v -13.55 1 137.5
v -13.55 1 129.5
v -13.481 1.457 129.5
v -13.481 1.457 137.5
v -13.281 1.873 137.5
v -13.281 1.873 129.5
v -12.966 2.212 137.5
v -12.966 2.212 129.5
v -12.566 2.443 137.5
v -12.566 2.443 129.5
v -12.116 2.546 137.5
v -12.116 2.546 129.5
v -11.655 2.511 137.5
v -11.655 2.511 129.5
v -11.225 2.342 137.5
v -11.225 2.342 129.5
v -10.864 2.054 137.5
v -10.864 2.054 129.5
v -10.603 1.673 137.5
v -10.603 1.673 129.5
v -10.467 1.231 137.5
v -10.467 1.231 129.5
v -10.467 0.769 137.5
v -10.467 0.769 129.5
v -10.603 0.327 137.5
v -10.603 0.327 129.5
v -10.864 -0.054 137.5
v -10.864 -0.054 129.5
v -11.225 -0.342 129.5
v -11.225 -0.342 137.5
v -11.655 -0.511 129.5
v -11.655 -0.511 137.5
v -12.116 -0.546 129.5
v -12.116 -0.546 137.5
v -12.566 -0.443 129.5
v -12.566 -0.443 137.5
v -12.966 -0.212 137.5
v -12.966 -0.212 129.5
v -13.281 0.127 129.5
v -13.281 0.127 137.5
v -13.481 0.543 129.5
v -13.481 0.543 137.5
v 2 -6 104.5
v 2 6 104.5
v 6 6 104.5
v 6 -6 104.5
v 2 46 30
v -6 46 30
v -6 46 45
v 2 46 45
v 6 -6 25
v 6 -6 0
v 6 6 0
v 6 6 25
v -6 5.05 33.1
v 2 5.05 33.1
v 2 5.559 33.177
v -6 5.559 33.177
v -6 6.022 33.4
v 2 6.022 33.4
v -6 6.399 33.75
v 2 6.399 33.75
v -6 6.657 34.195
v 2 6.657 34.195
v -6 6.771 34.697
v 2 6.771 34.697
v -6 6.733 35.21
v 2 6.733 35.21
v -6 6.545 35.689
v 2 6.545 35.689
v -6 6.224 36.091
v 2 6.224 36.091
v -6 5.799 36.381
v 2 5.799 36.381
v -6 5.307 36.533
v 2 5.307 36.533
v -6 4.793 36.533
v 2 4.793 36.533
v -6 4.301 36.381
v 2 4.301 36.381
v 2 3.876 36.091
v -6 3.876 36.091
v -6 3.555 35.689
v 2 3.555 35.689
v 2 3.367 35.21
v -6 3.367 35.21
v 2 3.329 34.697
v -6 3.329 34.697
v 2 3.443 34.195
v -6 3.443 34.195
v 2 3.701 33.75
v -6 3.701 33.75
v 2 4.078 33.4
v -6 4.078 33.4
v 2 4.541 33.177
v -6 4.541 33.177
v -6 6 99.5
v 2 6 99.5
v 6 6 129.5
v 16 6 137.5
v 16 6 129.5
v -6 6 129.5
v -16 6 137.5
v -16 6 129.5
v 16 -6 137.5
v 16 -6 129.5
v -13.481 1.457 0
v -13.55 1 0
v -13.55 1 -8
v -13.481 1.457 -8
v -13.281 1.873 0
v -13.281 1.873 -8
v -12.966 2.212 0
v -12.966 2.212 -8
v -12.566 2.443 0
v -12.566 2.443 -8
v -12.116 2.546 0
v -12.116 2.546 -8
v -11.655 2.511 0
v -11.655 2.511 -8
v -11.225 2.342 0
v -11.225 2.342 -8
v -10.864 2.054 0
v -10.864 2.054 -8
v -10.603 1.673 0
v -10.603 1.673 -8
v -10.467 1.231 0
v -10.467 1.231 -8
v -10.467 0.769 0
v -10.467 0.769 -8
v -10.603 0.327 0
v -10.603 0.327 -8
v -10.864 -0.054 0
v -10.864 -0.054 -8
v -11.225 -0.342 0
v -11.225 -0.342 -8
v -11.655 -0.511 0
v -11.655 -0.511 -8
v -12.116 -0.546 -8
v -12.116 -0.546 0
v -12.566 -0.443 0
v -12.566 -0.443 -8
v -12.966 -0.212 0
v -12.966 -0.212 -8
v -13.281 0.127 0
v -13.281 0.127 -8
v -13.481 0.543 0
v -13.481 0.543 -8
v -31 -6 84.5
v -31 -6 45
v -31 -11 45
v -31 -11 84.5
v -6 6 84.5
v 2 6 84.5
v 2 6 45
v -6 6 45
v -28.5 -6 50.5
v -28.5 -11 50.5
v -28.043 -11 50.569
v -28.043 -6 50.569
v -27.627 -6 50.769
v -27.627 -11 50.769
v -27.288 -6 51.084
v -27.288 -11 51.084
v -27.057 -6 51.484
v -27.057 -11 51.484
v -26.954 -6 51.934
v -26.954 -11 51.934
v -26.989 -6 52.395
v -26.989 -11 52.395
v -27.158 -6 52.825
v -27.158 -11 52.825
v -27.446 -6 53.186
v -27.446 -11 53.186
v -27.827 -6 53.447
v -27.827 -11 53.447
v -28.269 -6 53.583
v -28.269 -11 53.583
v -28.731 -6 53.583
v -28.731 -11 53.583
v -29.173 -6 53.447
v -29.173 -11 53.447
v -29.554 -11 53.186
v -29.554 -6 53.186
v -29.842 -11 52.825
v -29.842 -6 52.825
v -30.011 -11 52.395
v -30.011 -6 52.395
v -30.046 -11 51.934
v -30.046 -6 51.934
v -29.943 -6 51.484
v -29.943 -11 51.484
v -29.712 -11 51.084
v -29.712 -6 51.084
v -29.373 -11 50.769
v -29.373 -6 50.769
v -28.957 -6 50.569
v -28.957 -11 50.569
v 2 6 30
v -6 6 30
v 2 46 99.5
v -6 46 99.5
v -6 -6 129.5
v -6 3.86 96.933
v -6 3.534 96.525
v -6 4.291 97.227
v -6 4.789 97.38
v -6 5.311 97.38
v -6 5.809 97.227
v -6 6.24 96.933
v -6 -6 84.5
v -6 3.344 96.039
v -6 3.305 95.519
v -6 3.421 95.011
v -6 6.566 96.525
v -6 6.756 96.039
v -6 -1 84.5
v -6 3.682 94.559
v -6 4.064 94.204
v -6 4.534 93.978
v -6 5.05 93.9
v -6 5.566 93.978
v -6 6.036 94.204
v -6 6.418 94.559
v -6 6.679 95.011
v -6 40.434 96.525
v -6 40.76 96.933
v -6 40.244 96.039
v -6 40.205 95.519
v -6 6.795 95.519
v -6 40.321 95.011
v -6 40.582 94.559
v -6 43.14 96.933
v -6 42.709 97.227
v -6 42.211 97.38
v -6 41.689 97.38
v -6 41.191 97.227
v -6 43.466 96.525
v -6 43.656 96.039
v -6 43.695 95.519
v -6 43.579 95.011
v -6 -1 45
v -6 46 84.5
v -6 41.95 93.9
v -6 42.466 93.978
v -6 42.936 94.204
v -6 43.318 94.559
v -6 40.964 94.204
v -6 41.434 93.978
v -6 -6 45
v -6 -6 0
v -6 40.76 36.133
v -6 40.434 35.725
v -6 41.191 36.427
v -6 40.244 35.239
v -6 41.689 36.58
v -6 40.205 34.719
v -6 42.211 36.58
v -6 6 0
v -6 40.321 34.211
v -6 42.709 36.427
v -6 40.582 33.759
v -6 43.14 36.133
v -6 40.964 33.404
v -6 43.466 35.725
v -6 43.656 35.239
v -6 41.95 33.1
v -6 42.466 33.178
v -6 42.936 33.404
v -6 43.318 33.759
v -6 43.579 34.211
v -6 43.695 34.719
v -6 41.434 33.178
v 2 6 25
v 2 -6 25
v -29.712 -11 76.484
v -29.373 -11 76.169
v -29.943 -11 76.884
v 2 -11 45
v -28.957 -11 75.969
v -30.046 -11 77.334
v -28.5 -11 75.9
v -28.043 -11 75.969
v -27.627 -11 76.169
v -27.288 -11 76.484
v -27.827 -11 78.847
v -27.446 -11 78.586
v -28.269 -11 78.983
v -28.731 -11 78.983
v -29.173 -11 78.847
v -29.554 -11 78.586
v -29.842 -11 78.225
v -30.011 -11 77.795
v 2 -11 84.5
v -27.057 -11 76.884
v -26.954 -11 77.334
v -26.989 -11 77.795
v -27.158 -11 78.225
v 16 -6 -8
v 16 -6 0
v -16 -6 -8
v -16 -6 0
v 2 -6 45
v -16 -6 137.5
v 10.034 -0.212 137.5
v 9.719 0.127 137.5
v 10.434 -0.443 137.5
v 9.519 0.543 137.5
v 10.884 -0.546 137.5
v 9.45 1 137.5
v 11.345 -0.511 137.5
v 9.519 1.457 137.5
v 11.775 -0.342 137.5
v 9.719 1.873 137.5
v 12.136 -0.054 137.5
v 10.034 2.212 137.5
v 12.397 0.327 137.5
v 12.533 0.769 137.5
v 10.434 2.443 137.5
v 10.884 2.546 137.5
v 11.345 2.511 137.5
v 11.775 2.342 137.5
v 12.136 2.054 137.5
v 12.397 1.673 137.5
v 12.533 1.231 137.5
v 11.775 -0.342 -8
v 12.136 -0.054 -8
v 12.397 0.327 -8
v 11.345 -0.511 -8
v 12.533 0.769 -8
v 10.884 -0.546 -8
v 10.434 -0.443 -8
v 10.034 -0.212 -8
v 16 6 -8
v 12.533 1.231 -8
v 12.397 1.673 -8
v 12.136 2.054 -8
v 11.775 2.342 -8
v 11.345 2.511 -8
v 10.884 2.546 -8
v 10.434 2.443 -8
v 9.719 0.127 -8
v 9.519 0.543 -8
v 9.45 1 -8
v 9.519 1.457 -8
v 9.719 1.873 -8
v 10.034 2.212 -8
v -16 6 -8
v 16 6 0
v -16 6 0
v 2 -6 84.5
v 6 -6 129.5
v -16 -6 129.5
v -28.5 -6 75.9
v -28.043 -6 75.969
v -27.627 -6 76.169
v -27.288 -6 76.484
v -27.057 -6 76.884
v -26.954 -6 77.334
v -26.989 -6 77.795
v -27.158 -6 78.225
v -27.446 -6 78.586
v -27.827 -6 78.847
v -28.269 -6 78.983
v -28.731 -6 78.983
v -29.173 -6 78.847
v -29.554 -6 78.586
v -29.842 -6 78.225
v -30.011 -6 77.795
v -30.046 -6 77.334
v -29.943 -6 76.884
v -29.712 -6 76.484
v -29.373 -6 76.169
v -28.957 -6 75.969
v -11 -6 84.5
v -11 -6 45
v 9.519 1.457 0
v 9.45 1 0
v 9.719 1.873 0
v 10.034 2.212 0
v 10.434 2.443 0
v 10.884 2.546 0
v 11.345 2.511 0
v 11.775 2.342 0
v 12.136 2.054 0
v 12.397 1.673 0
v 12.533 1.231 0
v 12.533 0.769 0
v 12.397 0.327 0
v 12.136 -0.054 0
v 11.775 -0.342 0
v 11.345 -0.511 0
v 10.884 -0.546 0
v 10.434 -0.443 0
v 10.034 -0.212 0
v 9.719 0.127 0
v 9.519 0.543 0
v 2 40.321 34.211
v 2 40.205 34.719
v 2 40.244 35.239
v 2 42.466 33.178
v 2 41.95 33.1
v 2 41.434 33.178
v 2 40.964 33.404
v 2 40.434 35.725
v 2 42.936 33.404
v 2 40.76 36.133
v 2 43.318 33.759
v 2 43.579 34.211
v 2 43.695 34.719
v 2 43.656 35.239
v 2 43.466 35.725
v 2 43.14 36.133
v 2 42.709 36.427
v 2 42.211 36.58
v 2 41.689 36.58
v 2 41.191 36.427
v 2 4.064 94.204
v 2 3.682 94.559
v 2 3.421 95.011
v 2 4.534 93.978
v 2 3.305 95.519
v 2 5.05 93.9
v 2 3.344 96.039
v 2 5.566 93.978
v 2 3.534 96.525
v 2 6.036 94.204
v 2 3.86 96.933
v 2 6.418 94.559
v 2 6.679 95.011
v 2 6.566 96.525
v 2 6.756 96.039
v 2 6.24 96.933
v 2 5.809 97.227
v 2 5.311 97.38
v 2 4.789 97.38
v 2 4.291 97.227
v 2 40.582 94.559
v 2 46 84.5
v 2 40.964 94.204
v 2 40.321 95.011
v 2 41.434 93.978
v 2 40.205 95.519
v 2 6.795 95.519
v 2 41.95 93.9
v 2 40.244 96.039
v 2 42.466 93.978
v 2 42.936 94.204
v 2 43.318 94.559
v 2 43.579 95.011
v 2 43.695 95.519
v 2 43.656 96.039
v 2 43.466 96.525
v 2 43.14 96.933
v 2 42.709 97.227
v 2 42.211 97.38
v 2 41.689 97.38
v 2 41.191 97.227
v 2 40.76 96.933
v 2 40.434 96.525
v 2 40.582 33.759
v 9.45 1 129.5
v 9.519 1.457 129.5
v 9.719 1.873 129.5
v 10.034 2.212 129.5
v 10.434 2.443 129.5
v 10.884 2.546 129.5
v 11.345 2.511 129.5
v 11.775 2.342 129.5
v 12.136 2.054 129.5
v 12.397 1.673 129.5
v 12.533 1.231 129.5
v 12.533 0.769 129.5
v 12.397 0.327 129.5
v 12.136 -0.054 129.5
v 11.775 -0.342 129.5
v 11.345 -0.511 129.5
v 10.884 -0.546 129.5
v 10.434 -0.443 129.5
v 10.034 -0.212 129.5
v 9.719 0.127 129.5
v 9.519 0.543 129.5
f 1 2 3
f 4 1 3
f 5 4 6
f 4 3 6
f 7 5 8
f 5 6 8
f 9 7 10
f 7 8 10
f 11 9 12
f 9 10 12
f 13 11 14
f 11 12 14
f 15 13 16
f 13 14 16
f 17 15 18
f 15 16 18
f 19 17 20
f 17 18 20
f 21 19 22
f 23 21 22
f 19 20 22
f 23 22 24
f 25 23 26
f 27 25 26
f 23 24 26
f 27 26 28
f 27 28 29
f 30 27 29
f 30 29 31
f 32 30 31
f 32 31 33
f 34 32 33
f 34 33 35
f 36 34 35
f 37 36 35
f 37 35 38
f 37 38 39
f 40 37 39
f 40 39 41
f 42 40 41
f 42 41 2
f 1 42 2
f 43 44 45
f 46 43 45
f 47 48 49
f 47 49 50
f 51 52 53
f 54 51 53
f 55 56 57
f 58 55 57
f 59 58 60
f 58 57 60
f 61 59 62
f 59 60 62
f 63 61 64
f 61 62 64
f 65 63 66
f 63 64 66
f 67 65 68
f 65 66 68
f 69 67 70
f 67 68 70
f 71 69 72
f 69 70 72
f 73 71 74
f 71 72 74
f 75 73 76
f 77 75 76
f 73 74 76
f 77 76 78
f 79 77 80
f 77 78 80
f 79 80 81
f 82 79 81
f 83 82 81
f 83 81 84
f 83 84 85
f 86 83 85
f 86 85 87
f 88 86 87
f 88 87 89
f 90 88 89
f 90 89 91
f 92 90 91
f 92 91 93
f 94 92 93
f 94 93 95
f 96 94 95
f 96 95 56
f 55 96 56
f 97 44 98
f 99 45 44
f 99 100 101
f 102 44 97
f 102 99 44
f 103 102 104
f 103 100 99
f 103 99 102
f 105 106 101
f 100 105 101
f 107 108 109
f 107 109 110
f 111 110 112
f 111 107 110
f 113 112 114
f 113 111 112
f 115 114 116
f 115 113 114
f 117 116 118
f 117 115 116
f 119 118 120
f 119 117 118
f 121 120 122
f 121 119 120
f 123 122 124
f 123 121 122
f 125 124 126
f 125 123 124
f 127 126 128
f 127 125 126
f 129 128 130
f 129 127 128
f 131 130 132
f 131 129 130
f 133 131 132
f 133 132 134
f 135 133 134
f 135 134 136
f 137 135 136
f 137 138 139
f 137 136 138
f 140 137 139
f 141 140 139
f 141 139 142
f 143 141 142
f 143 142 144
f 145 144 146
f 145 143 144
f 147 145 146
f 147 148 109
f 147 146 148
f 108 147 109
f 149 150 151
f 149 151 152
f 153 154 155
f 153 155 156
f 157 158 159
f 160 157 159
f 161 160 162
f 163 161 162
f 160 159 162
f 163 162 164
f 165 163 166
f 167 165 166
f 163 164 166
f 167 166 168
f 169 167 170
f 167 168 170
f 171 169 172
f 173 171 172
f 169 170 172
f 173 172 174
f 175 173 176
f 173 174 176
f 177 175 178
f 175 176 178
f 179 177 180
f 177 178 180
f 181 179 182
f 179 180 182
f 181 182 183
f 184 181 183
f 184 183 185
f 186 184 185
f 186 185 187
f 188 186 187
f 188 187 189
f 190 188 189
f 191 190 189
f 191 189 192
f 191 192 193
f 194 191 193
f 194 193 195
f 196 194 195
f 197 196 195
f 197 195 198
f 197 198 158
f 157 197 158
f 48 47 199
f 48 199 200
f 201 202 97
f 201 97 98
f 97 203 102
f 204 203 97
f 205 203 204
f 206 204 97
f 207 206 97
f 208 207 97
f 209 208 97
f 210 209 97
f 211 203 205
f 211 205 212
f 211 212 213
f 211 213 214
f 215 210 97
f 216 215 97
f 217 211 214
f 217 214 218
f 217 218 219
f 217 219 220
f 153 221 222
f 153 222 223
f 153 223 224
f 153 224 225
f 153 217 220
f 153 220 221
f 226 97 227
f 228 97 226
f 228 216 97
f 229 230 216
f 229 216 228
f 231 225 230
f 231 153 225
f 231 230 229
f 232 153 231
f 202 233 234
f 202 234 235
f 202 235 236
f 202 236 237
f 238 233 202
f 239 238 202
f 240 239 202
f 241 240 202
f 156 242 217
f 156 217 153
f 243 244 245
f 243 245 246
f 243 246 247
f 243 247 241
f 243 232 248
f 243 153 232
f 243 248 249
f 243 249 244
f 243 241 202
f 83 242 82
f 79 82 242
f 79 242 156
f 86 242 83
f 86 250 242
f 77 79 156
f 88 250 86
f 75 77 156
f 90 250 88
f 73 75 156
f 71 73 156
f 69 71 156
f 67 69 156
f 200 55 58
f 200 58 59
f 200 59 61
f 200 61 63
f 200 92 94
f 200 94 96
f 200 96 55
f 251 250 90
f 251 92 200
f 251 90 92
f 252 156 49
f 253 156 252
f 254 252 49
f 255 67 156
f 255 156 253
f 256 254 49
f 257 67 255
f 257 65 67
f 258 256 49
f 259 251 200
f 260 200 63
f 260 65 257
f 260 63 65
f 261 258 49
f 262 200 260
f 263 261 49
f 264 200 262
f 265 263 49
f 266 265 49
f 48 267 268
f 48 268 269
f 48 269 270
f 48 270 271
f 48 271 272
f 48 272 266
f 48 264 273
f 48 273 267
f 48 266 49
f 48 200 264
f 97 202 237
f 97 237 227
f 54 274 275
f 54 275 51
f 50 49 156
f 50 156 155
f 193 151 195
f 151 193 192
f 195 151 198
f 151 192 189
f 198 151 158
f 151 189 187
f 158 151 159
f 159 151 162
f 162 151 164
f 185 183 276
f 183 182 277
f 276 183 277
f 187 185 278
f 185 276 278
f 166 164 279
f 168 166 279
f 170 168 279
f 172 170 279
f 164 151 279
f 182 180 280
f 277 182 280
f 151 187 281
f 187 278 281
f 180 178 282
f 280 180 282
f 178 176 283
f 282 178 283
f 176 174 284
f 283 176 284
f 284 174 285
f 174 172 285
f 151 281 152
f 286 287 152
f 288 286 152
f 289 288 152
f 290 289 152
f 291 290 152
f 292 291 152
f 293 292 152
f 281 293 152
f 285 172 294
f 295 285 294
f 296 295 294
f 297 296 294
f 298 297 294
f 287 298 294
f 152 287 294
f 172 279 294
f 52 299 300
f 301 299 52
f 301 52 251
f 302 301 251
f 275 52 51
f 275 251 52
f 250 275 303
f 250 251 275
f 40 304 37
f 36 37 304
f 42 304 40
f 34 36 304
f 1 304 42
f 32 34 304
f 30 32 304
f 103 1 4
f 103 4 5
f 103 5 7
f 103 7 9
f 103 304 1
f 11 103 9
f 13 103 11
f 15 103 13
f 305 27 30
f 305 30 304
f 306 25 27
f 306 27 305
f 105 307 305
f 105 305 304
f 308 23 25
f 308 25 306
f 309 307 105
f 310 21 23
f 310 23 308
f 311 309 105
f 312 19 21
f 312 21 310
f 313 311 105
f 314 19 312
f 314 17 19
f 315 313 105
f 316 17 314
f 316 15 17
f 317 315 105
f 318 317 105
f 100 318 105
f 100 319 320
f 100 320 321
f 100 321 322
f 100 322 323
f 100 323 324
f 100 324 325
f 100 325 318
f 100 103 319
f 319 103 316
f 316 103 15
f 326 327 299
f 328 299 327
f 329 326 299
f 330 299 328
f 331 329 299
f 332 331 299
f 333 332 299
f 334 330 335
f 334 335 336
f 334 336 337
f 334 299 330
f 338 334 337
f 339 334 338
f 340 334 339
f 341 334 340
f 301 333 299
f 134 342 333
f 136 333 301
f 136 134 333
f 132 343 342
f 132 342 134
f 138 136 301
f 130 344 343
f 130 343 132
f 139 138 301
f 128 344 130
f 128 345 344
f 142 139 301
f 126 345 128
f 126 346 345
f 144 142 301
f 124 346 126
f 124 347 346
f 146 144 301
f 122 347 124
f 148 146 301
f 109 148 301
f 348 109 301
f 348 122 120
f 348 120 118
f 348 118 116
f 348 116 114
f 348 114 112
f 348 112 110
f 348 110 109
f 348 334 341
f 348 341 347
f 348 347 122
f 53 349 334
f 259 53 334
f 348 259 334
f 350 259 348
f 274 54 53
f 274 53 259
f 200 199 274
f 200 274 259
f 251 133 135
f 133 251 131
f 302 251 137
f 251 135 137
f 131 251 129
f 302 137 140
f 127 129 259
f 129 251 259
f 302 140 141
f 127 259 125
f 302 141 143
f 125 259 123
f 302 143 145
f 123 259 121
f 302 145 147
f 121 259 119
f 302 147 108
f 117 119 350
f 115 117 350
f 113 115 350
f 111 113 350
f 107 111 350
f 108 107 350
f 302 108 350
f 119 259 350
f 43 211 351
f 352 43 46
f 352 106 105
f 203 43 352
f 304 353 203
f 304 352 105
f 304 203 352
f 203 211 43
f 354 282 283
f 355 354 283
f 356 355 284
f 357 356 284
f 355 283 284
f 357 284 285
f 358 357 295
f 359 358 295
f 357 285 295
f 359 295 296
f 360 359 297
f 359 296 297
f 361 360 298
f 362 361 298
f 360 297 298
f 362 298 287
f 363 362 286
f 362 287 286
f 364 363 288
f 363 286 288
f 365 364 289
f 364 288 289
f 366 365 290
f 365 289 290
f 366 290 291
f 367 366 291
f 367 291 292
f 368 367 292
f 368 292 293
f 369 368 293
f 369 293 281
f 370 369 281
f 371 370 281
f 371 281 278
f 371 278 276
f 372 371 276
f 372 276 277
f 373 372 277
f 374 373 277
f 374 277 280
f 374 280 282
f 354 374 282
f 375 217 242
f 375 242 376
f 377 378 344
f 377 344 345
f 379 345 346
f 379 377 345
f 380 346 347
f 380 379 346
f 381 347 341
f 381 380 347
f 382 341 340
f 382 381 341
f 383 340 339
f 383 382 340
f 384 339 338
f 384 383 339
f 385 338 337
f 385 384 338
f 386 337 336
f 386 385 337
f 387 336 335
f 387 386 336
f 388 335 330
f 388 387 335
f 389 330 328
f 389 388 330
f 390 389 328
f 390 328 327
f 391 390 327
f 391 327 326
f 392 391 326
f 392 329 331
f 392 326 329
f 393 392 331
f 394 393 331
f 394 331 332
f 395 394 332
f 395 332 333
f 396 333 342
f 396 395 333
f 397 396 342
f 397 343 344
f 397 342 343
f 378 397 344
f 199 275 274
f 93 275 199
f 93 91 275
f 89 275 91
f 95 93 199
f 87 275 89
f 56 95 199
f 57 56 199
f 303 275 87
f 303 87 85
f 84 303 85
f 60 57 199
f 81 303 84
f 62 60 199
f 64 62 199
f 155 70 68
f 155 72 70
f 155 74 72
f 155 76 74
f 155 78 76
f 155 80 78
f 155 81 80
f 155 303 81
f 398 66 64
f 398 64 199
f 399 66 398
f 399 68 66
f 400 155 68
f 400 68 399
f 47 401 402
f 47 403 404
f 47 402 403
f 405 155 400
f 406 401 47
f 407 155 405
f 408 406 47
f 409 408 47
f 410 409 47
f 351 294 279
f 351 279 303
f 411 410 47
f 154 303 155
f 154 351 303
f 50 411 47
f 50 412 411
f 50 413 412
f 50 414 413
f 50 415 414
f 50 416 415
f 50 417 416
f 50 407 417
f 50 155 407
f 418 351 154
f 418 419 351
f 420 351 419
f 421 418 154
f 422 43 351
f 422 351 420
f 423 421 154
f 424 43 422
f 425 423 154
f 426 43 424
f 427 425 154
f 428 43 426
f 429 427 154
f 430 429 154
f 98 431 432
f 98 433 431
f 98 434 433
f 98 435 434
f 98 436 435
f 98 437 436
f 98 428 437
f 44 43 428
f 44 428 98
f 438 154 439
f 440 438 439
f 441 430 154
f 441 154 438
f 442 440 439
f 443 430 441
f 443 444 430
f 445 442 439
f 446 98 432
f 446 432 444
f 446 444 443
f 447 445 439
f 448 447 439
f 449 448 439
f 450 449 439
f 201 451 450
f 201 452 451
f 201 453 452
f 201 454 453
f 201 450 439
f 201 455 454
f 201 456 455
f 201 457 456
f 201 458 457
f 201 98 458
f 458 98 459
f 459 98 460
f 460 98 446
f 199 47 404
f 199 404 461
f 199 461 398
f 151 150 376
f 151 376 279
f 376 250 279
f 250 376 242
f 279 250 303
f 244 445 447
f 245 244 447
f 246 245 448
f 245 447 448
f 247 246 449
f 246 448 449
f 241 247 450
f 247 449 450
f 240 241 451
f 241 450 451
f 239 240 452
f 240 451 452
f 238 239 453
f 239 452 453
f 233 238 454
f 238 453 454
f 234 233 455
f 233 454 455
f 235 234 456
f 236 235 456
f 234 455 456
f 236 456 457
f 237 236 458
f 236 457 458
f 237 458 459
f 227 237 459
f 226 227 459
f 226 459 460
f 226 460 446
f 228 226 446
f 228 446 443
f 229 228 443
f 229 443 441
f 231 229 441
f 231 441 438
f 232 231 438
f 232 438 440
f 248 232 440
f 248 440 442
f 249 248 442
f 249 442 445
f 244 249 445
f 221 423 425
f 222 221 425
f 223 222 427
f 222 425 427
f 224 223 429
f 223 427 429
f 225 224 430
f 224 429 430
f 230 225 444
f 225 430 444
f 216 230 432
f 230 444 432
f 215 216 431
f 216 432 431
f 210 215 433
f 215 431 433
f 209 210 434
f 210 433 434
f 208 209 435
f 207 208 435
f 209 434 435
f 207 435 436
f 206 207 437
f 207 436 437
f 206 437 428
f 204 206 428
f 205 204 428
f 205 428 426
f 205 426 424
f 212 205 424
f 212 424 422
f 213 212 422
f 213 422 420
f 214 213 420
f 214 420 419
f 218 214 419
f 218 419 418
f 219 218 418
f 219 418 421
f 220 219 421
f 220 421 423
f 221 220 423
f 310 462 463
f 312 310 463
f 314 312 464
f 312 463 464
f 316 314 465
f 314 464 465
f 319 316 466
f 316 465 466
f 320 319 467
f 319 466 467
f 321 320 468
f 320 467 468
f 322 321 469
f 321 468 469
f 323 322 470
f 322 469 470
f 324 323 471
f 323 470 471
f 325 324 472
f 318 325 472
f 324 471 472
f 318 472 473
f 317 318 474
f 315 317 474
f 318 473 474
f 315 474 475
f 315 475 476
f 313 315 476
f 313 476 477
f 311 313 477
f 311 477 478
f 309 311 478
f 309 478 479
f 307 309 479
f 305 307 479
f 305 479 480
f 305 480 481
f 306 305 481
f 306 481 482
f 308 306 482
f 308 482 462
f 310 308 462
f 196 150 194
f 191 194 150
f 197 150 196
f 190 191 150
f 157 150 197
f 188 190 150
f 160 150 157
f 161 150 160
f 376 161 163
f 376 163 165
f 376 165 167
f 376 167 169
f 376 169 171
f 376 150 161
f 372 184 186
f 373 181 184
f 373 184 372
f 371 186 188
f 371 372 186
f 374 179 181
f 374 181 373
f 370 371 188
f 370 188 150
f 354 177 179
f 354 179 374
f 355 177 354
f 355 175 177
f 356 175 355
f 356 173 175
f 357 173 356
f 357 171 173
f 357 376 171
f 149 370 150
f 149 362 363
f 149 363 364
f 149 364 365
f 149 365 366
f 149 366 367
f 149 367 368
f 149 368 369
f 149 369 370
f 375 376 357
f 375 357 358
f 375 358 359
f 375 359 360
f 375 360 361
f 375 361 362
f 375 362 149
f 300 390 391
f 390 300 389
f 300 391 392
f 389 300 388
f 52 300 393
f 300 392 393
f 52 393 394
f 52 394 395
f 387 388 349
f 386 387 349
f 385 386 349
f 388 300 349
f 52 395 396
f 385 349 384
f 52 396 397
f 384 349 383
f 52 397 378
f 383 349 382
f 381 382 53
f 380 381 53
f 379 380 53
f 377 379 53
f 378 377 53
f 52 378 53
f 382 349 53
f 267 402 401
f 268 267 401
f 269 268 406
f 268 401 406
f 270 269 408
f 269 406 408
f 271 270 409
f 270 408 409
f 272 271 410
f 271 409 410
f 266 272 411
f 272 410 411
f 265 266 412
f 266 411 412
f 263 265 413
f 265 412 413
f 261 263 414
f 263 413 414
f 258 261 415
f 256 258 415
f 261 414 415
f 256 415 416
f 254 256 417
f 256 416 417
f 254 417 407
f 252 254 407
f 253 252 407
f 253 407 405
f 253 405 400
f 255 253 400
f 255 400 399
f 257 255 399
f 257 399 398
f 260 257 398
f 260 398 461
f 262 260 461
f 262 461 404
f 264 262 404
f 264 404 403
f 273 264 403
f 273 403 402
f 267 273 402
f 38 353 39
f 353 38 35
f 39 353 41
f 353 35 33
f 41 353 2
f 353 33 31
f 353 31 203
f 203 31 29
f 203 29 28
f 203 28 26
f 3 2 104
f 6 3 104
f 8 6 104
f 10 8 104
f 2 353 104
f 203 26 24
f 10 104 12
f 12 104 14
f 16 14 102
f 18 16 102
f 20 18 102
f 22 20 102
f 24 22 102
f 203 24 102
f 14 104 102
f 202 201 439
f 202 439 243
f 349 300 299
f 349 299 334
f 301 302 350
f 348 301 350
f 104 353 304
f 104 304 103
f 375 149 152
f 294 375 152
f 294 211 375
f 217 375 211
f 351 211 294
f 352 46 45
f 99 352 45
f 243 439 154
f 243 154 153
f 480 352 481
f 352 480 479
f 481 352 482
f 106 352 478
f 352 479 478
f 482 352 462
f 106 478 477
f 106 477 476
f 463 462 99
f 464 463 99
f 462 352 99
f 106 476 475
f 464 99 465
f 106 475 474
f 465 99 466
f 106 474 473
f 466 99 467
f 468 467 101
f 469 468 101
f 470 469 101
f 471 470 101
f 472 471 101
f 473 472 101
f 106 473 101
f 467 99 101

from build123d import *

# Parameters (mm, degrees)
SKETCH_1_W          = 12
SKETCH_1_H          = 12
EXTRUDE_1_DEPTH     = 129.5
SKETCH_3_W          = 32
SKETCH_3_H          = 12
EXTRUDE_2_DEPTH     = 8
SKETCH_4_W          = 32
SKETCH_4_H          = 12
EXTRUDE_3_DEPTH     = 8
SKETCH_5_W          = 79.5
SKETCH_5_H          = 52
EXTRUDE_4_DEPTH     = 8
SKETCH_6_W          = 59.5
SKETCH_6_H          = 40
CUT_EXTRUDE_1_DEPTH = 10
SKETCH_10_W         = 8
SKETCH_10_H         = 40
EXTRUDE_7_DEPTH     = 10
SKETCH_11_W         = 8
SKETCH_11_H         = 40
EXTRUDE_8_DEPTH     = 10
SKETCH_13_W         = 8
SKETCH_13_H         = 40
CUT_EXTRUDE_3_DEPTH = 5
SKETCH_14_W         = 8
SKETCH_14_H         = 40
CUT_EXTRUDE_4_DEPTH = 5
SKETCH_17_R         = 1.55
CUT_EXTRUDE_5_DEPTH = 146.870661889
SKETCH_17_2_R       = 1.55
CUT_EXTRUDE_6_DEPTH = 146.870661889
SKETCH_19_W         = 4
SKETCH_19_H         = 79.5
CUT_EXTRUDE_7_DEPTH = 145.091117006
SKETCH_20_W         = 8
SKETCH_20_H         = 39.5
EXTRUDE_9_DEPTH     = 5
SKETCH_21_W         = 39.5
SKETCH_21_H         = 5
EXTRUDE_10_DEPTH    = 25
SKETCH_23_R         = 1.55
CUT_EXTRUDE_8_DEPTH = 153.040290713
CUT_EXTRUDE_9_REACH = 150.699
SKETCH_25_R         = 1.75
SKETCH_25_R_2       = 1.726022487
EXTRUDE_11_DEPTH    = 39.5


with BuildPart() as part:
    # 草图1 → 凸台-拉伸1 (new body)
    with BuildSketch(Plane.XY):
        Rectangle(SKETCH_1_W, SKETCH_1_H)
    extrude(amount=EXTRUDE_1_DEPTH)

    # 草图3 → 凸台-拉伸2 (add)
    with BuildSketch(Plane.XY.offset(129.5)):
        Rectangle(SKETCH_3_W, SKETCH_3_H)
    extrude(amount=EXTRUDE_2_DEPTH)

    # 草图4 → 凸台-拉伸3 (add)
    with BuildSketch(Plane(origin=(0, 0, 0), x_dir=(-1, 0, 0), z_dir=(0, 0, -1))):
        Rectangle(SKETCH_4_W, SKETCH_4_H)
    extrude(amount=EXTRUDE_3_DEPTH)

    # 草图5 → 凸台-拉伸4 (add)
    with BuildSketch(Plane.ZY.offset(6)):
        with Locations((64.75, 20)):
            Rectangle(SKETCH_5_W, SKETCH_5_H)
    extrude(amount=-EXTRUDE_4_DEPTH)

    # 草图6 → 切除-拉伸1 (cut)
    with BuildSketch(Plane(origin=(2, 0, 0), x_dir=(0, 0, -1), z_dir=(1, 0, 0))):
        with Locations((-64.75, 26)):
            Rectangle(SKETCH_6_W, SKETCH_6_H)
    extrude(amount=-CUT_EXTRUDE_1_DEPTH, mode=Mode.SUBTRACT)

    # 草图10 → 凸台-拉伸7 (add)
    with BuildSketch(Plane.XY.offset(35)):
        with Locations((-2, 26)):
            Rectangle(SKETCH_10_W, SKETCH_10_H)
    extrude(amount=EXTRUDE_7_DEPTH)

    # 草图11 → 凸台-拉伸8 (add)
    with BuildSketch(Plane(origin=(0, 0, 94.5), x_dir=(-1, 0, 0), z_dir=(0, 0, -1))):
        with Locations((2, 26)):
            Rectangle(SKETCH_11_W, SKETCH_11_H)
    extrude(amount=EXTRUDE_8_DEPTH)

    # 草图13 → 切除-拉伸3 (cut)
    with BuildSketch(Plane(origin=(0, 0, 25), x_dir=(-1, 0, 0), z_dir=(0, 0, -1))):
        with Locations((2, 26)):
            Rectangle(SKETCH_13_W, SKETCH_13_H)
    extrude(amount=-CUT_EXTRUDE_3_DEPTH, mode=Mode.SUBTRACT)

    # 草图14 → 切除-拉伸4 (cut)
    with BuildSketch(Plane.XY.offset(104.5)):
        with Locations((-2, 26)):
            Rectangle(SKETCH_14_W, SKETCH_14_H)
    extrude(amount=-CUT_EXTRUDE_4_DEPTH, mode=Mode.SUBTRACT)

    # 草图17 → 切除-拉伸5 (cut, through all)
    with BuildSketch(Plane(origin=(0, 0, 129.5), x_dir=(-1, 0, 0), z_dir=(0, 0, -1))):
        with Locations((12, 1)):
            Circle(SKETCH_17_R)
        with Locations((-11, 1)):
            Circle(SKETCH_17_R)
    extrude(amount=-CUT_EXTRUDE_5_DEPTH, mode=Mode.SUBTRACT)

    # 草图17<2> → 切除-拉伸6 (cut, through all)
    with BuildSketch(Plane(origin=(0, 0, 129.5), x_dir=(-1, 0, 0), z_dir=(0, 0, -1))):
        with Locations((12, 1)):
            Circle(SKETCH_17_2_R)
        with Locations((-11, 1)):
            Circle(SKETCH_17_2_R)
    extrude(amount=CUT_EXTRUDE_6_DEPTH, mode=Mode.SUBTRACT)

    # 草图19 → 切除-拉伸7 (cut, through all)
    with BuildSketch(Plane(origin=(0, 6, 0), x_dir=(1, 0, 0), z_dir=(0, 1, 0))):
        with Locations((4, -64.75)):
            Rectangle(SKETCH_19_W, SKETCH_19_H)
    extrude(amount=-CUT_EXTRUDE_7_DEPTH, mode=Mode.SUBTRACT)

    # 草图20 → 凸台-拉伸9 (add)
    with BuildSketch(Plane.XZ.offset(6)):
        with Locations((-2, 64.75)):
            Rectangle(SKETCH_20_W, SKETCH_20_H)
    extrude(amount=EXTRUDE_9_DEPTH)

    # 草图21 → 凸台-拉伸10 (add)
    with BuildSketch(Plane.ZY.offset(6)):
        with Locations((64.75, -8.5)):
            Rectangle(SKETCH_21_W, SKETCH_21_H)
    extrude(amount=EXTRUDE_10_DEPTH)

    # 草图23 → 切除-拉伸8 (cut, through all)
    with BuildSketch(Plane.XZ.offset(11)):
        with Locations(Location((-28.5, 77.45, 0), (0, 0, 270))):
            Circle(SKETCH_23_R)
        with Locations(Location((-28.5, 52.05, 0), (0, 0, 270))):
            Circle(SKETCH_23_R)
    extrude(amount=-CUT_EXTRUDE_8_DEPTH, mode=Mode.SUBTRACT)

    # 草图25 → 切除-拉伸9 (cut, up to next)
    with BuildSketch(Plane(origin=(2, 0, 0), x_dir=(0, 0, -1), z_dir=(1, 0, 0)), mode=Mode.PRIVATE) as cut_extrude_9_sk1:
        with Locations((-95.65, 41.95)):
            Circle(SKETCH_25_R)
    cut_extrude_9_tool1 = extrude(cut_extrude_9_sk1.sketch, amount=-CUT_EXTRUDE_9_REACH, mode=Mode.PRIVATE) & part.part
    # 草图25 → 切除-拉伸9 (cut, up to next)
    with BuildSketch(Plane(origin=(2, 0, 0), x_dir=(0, 0, -1), z_dir=(1, 0, 0)), mode=Mode.PRIVATE) as cut_extrude_9_sk2:
        with Locations((-95.65, 5.05)):
            Circle(SKETCH_25_R)
    cut_extrude_9_tool2 = extrude(cut_extrude_9_sk2.sketch, amount=-CUT_EXTRUDE_9_REACH, mode=Mode.PRIVATE) & part.part
    # 草图25 → 切除-拉伸9 (cut, up to next)
    with BuildSketch(Plane(origin=(2, 0, 0), x_dir=(0, 0, -1), z_dir=(1, 0, 0)), mode=Mode.PRIVATE) as cut_extrude_9_sk3:
        with Locations((-34.826022487, 5.05)):
            Circle(SKETCH_25_R_2)
    cut_extrude_9_tool3 = extrude(cut_extrude_9_sk3.sketch, amount=-CUT_EXTRUDE_9_REACH, mode=Mode.PRIVATE) & part.part
    # 草图25 → 切除-拉伸9 (cut, up to next)
    with BuildSketch(Plane(origin=(2, 0, 0), x_dir=(0, 0, -1), z_dir=(1, 0, 0)), mode=Mode.PRIVATE) as cut_extrude_9_sk4:
        with Locations((-34.85, 41.95)):
            Circle(SKETCH_25_R)
    cut_extrude_9_tool4 = extrude(cut_extrude_9_sk4.sketch, amount=-CUT_EXTRUDE_9_REACH, mode=Mode.PRIVATE) & part.part
    add(cut_extrude_9_tool1.solids().sort_by_distance((2, 41.95, 95.65))[0], mode=Mode.SUBTRACT)
    add(cut_extrude_9_tool2.solids().sort_by_distance((2, 5.05, 95.65))[0], mode=Mode.SUBTRACT)
    add(cut_extrude_9_tool3.solids().sort_by_distance((2, 5.05, 34.826022))[0], mode=Mode.SUBTRACT)
    add(cut_extrude_9_tool4.solids().sort_by_distance((2, 41.95, 34.85))[0], mode=Mode.SUBTRACT)

    # 草图26 → 凸台-拉伸11 (add)
    with BuildSketch(Plane(origin=(0, 0, 45), x_dir=(-1, 0, 0), z_dir=(0, 0, -1))):
        Polygon((6, -6), (6, -1), (11, -6), align=None)
    extrude(amount=-EXTRUDE_11_DEPTH)


solid = part.part
